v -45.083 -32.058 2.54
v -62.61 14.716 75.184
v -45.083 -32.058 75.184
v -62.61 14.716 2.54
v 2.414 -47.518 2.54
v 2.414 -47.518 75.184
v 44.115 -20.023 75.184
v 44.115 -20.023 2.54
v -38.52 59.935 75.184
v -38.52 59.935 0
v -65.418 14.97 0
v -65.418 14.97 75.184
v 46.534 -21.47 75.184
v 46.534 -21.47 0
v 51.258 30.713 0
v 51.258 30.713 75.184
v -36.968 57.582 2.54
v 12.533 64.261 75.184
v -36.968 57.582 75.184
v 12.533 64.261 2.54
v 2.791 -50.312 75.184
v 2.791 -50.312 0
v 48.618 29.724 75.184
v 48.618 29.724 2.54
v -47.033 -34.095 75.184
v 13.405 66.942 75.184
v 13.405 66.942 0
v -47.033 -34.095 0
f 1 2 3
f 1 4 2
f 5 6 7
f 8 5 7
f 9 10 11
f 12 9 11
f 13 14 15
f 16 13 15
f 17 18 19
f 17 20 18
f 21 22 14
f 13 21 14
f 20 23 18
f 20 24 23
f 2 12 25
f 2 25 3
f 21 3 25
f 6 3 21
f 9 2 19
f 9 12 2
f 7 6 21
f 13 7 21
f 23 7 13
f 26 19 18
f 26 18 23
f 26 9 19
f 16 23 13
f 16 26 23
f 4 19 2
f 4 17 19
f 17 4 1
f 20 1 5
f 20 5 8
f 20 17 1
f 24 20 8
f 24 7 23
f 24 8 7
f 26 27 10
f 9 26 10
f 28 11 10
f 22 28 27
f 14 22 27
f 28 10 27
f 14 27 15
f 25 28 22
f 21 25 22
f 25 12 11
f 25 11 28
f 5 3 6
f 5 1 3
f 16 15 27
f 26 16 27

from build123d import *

# Parameters (mm, degrees)
F1_DEPTH = 75.184
F2_T     = -101.6
F3_T     = -2.54


with BuildPart() as f1:
    # F0 (on Top) → F1 (new body)
    with BuildSketch(Plane.XY):
        Polygon((13.405336, 66.941666), (-38.520241, 59.935433), (-65.417615, 14.970067), (-47.032514, -34.094594), (2.790705, -50.311859), (46.534143, -21.469797), (51.258098, 30.712931), align=None)
    extrude(amount=F1_DEPTH)

    # F2
    f2_openings = [f1.faces().sort_by_distance(p)[0] for p in [
        (-5.283155, 9.526264, 75.184),
    ]]
    offset(amount=F2_T, openings=f2_openings)

    # F3
    f3_openings = [f1.faces().sort_by_distance(p)[0] for p in [
        (-5.283155, 9.526264, 75.184),
    ]]
    offset(amount=F3_T, openings=f3_openings)


solid = f1.part
